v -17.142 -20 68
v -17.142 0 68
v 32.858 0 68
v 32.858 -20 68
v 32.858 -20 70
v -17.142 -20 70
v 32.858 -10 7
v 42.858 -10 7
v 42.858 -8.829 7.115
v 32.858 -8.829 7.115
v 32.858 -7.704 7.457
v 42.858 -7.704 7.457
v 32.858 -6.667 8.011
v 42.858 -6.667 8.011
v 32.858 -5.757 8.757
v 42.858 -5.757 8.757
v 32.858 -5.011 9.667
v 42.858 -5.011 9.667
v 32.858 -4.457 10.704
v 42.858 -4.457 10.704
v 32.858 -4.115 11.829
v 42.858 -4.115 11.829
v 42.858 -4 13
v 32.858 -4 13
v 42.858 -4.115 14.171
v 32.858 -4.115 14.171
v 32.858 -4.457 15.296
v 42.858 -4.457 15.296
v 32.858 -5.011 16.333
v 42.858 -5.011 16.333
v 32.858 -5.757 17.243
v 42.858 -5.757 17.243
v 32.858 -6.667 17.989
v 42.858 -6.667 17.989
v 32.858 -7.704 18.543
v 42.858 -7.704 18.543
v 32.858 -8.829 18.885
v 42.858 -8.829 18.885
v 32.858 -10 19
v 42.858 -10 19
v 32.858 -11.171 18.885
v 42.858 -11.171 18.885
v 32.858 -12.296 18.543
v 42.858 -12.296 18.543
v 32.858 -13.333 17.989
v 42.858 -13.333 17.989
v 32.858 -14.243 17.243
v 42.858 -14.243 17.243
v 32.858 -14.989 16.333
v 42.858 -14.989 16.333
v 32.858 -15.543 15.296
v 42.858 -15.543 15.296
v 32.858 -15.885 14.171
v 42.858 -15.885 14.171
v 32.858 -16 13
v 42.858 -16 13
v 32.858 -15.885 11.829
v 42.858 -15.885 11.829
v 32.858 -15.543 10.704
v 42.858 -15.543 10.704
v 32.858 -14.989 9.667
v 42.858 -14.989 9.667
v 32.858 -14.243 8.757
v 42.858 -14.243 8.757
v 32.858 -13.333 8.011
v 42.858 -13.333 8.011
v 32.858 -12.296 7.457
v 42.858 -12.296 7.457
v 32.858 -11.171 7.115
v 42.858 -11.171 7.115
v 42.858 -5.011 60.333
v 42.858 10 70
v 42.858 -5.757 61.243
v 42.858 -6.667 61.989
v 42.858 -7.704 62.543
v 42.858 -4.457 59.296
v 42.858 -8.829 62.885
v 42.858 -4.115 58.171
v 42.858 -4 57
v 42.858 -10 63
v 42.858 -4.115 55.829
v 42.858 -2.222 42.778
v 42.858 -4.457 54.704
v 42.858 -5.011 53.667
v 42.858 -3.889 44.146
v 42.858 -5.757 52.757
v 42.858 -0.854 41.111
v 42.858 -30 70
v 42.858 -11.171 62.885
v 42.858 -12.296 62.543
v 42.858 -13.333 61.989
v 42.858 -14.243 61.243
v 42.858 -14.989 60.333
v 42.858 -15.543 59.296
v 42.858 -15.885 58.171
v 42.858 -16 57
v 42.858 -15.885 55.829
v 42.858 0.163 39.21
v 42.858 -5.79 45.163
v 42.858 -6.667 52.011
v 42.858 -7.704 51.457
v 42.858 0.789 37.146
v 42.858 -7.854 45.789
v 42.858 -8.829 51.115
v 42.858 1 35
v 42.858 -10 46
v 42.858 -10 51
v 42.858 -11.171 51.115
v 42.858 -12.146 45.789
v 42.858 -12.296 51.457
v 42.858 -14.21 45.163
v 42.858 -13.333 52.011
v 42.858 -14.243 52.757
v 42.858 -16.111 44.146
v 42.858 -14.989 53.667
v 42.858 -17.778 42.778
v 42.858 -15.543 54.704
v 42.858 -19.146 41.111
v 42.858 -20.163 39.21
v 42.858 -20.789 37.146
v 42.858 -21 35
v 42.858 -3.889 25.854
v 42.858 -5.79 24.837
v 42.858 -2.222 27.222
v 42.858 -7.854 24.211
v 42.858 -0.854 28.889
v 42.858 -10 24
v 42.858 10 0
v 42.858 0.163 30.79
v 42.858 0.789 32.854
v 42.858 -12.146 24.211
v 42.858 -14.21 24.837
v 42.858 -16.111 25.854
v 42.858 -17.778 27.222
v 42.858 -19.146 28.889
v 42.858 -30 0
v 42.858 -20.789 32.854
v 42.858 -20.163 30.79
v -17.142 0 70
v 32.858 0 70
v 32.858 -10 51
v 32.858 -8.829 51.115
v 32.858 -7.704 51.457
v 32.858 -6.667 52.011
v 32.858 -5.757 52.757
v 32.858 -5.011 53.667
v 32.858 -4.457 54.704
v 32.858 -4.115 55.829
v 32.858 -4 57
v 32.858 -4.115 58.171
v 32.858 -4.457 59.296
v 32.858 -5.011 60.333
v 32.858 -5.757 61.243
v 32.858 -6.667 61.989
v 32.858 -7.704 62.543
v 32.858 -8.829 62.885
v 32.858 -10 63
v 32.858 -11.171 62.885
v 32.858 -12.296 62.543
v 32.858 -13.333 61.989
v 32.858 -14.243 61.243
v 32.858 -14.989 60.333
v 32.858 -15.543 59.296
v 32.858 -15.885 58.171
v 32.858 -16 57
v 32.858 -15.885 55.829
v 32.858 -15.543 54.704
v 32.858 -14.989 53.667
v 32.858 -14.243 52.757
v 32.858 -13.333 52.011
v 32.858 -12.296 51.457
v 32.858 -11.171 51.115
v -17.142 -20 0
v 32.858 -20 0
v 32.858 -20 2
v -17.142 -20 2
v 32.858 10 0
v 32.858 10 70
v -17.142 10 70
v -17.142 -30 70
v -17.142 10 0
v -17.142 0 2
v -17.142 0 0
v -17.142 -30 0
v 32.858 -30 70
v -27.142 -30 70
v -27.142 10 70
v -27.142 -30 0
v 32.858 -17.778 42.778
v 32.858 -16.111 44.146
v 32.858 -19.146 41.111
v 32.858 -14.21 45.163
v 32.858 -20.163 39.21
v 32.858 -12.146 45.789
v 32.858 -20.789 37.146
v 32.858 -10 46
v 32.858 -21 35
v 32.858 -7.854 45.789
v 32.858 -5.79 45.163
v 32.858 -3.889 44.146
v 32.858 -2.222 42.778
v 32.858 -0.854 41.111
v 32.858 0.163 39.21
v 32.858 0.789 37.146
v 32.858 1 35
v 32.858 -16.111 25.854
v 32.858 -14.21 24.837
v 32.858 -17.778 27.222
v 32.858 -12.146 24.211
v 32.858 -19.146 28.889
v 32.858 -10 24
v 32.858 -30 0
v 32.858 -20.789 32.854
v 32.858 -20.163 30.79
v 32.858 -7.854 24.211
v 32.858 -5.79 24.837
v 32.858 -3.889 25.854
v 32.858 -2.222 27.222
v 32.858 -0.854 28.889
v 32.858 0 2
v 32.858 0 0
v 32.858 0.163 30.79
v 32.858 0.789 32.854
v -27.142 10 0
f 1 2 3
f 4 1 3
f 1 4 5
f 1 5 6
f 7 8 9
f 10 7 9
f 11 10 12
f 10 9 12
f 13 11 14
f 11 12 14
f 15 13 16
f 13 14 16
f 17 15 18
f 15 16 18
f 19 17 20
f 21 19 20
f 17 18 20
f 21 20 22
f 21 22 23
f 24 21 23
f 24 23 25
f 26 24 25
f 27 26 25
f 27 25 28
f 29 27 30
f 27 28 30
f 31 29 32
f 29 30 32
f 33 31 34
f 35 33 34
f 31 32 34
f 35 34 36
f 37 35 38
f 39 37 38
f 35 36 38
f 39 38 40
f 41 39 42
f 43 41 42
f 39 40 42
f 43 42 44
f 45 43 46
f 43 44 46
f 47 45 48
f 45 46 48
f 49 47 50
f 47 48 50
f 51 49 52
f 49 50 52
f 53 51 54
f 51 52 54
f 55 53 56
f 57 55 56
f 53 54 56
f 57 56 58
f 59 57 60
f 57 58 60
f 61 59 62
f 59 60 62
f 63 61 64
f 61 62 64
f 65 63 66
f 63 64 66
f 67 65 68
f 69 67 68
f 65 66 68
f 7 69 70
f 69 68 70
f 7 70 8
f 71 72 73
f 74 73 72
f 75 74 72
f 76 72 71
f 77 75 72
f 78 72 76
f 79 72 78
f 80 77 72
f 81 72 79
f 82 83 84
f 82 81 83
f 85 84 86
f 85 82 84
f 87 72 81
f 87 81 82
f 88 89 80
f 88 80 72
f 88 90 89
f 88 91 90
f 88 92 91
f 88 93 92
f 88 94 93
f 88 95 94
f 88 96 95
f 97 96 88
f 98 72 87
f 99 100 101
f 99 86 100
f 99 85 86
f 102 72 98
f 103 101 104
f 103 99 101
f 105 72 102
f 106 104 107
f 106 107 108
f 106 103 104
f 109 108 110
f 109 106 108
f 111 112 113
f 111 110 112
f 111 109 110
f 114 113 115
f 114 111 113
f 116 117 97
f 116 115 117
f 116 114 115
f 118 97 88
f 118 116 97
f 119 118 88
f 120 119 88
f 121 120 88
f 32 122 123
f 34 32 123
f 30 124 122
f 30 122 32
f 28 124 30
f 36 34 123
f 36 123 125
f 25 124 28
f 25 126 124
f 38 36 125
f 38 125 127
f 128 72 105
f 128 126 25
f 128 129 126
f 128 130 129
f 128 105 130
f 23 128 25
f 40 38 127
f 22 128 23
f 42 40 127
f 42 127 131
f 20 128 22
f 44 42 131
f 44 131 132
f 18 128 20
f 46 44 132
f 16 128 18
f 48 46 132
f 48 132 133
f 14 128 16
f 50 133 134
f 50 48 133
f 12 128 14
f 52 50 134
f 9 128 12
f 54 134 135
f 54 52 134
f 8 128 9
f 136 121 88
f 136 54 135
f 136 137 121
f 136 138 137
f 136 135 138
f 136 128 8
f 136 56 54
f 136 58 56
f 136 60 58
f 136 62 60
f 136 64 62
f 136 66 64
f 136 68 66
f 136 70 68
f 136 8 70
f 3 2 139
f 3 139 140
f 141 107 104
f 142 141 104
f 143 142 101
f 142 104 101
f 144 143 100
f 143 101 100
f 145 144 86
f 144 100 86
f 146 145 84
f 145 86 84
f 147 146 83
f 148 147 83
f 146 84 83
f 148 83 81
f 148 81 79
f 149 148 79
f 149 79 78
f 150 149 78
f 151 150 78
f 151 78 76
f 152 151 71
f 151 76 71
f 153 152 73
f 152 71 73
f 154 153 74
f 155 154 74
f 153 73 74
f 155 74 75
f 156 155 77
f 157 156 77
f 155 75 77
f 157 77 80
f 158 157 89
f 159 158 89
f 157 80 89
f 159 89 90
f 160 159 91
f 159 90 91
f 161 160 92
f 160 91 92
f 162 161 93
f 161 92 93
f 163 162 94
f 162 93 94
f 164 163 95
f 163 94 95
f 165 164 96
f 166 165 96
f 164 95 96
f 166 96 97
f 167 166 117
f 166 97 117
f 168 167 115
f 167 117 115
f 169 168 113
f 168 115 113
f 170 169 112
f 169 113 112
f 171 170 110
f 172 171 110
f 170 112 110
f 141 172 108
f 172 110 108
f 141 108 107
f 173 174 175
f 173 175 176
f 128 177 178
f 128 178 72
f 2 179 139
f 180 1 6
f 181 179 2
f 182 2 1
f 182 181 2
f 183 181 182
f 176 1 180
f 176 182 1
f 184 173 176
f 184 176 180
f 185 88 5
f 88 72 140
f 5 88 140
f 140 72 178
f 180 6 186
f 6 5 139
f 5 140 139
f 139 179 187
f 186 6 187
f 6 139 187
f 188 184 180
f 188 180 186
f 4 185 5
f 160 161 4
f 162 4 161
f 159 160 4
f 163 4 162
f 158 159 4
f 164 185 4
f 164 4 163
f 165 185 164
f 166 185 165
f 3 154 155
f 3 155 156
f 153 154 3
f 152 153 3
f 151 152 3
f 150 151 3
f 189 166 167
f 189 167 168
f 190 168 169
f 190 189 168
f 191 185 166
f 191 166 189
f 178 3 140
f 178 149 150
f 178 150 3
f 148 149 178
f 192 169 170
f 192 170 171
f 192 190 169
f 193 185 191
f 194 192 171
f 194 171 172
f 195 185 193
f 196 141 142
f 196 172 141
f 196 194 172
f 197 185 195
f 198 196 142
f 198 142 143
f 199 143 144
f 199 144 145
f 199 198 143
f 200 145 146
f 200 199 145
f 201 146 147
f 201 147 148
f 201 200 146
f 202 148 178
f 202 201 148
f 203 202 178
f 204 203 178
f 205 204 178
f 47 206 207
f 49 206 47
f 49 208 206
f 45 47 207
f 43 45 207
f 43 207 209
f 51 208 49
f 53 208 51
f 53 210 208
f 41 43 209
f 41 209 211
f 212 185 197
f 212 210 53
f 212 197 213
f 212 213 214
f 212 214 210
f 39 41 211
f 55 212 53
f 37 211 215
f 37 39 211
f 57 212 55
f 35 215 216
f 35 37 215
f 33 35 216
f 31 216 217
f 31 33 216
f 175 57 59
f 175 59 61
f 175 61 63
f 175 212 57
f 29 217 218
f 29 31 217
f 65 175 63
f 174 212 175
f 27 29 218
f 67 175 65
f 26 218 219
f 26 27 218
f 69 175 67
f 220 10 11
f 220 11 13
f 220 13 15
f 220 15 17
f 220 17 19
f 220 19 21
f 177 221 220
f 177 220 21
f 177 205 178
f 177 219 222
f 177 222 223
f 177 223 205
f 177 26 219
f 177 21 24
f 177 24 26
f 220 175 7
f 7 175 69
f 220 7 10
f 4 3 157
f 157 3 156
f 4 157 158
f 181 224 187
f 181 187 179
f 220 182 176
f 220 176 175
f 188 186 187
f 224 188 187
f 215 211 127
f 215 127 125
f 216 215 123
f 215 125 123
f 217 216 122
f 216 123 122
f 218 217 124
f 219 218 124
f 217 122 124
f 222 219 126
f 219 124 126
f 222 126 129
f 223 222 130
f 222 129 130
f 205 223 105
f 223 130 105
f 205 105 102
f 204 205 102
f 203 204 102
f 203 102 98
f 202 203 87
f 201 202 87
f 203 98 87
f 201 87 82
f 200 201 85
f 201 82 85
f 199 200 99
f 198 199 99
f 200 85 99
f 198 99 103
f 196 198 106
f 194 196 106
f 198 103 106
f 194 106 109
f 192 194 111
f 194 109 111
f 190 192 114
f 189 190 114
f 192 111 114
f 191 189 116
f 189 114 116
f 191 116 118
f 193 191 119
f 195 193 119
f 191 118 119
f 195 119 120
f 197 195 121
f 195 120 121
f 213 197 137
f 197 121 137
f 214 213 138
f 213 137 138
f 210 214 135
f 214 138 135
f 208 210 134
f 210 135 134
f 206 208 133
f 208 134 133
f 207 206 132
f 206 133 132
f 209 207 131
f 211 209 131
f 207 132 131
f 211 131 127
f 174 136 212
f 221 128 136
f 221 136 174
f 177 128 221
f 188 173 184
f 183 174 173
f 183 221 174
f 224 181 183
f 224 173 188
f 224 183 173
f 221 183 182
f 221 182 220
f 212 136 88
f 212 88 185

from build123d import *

# Parameters (mm, degrees)
BOSS_EXTRUDE1_DEPTH = 70
SKETCH3_W           = 50
SKETCH3_H           = 66
CUT_EXTRUDE1_DEPTH  = 88.388879183
SKETCH4_R           = 11
CUT_EXTRUDE2_DEPTH  = 10
SKETCH5_R           = 6
CUT_EXTRUDE3_DEPTH  = 10


with BuildPart() as part:
    # Sketch1 → Boss-Extrude1 (new body)
    with BuildSketch(Plane.XY):
        Polygon((-17.141906192, 0), (32.858093808, 0), (32.858093808, 10), (42.858093808, 10), (42.858093808, -30), (32.858093808, -30), (32.858093808, -20), (-17.141906192, -20), (-17.141906192, -30), (-27.141906192, -30), (-27.141906192, 10), (-17.141906192, 10), align=None)
    extrude(amount=BOSS_EXTRUDE1_DEPTH)

    # Sketch3 → Cut-Extrude1 (cut, through all)
    with BuildSketch(Plane(origin=(0, 0, 0), x_dir=(1, 0, 0), z_dir=(0, 1, 0))):
        with Locations((7.858093808, -35)):
            Rectangle(SKETCH3_W, SKETCH3_H)
    extrude(amount=-CUT_EXTRUDE1_DEPTH, mode=Mode.SUBTRACT)

    # Sketch4 → Cut-Extrude2 (cut)
    with BuildSketch(Plane(origin=(42.858093808, 0, 0), x_dir=(0, 0, -1), z_dir=(1, 0, 0))):
        with Locations((-35, -10)):
            Circle(SKETCH4_R)
    extrude(amount=-CUT_EXTRUDE2_DEPTH, mode=Mode.SUBTRACT)

    # Sketch5 → Cut-Extrude3 (cut)
    with BuildSketch(Plane(origin=(42.858093808, 0, 0), x_dir=(0, 0, -1), z_dir=(1, 0, 0))):
        with Locations((-13, -10)):
            Circle(SKETCH5_R)
        with Locations((-57, -10)):
            Circle(SKETCH5_R)
    extrude(amount=-CUT_EXTRUDE3_DEPTH, mode=Mode.SUBTRACT)


solid = part.part
